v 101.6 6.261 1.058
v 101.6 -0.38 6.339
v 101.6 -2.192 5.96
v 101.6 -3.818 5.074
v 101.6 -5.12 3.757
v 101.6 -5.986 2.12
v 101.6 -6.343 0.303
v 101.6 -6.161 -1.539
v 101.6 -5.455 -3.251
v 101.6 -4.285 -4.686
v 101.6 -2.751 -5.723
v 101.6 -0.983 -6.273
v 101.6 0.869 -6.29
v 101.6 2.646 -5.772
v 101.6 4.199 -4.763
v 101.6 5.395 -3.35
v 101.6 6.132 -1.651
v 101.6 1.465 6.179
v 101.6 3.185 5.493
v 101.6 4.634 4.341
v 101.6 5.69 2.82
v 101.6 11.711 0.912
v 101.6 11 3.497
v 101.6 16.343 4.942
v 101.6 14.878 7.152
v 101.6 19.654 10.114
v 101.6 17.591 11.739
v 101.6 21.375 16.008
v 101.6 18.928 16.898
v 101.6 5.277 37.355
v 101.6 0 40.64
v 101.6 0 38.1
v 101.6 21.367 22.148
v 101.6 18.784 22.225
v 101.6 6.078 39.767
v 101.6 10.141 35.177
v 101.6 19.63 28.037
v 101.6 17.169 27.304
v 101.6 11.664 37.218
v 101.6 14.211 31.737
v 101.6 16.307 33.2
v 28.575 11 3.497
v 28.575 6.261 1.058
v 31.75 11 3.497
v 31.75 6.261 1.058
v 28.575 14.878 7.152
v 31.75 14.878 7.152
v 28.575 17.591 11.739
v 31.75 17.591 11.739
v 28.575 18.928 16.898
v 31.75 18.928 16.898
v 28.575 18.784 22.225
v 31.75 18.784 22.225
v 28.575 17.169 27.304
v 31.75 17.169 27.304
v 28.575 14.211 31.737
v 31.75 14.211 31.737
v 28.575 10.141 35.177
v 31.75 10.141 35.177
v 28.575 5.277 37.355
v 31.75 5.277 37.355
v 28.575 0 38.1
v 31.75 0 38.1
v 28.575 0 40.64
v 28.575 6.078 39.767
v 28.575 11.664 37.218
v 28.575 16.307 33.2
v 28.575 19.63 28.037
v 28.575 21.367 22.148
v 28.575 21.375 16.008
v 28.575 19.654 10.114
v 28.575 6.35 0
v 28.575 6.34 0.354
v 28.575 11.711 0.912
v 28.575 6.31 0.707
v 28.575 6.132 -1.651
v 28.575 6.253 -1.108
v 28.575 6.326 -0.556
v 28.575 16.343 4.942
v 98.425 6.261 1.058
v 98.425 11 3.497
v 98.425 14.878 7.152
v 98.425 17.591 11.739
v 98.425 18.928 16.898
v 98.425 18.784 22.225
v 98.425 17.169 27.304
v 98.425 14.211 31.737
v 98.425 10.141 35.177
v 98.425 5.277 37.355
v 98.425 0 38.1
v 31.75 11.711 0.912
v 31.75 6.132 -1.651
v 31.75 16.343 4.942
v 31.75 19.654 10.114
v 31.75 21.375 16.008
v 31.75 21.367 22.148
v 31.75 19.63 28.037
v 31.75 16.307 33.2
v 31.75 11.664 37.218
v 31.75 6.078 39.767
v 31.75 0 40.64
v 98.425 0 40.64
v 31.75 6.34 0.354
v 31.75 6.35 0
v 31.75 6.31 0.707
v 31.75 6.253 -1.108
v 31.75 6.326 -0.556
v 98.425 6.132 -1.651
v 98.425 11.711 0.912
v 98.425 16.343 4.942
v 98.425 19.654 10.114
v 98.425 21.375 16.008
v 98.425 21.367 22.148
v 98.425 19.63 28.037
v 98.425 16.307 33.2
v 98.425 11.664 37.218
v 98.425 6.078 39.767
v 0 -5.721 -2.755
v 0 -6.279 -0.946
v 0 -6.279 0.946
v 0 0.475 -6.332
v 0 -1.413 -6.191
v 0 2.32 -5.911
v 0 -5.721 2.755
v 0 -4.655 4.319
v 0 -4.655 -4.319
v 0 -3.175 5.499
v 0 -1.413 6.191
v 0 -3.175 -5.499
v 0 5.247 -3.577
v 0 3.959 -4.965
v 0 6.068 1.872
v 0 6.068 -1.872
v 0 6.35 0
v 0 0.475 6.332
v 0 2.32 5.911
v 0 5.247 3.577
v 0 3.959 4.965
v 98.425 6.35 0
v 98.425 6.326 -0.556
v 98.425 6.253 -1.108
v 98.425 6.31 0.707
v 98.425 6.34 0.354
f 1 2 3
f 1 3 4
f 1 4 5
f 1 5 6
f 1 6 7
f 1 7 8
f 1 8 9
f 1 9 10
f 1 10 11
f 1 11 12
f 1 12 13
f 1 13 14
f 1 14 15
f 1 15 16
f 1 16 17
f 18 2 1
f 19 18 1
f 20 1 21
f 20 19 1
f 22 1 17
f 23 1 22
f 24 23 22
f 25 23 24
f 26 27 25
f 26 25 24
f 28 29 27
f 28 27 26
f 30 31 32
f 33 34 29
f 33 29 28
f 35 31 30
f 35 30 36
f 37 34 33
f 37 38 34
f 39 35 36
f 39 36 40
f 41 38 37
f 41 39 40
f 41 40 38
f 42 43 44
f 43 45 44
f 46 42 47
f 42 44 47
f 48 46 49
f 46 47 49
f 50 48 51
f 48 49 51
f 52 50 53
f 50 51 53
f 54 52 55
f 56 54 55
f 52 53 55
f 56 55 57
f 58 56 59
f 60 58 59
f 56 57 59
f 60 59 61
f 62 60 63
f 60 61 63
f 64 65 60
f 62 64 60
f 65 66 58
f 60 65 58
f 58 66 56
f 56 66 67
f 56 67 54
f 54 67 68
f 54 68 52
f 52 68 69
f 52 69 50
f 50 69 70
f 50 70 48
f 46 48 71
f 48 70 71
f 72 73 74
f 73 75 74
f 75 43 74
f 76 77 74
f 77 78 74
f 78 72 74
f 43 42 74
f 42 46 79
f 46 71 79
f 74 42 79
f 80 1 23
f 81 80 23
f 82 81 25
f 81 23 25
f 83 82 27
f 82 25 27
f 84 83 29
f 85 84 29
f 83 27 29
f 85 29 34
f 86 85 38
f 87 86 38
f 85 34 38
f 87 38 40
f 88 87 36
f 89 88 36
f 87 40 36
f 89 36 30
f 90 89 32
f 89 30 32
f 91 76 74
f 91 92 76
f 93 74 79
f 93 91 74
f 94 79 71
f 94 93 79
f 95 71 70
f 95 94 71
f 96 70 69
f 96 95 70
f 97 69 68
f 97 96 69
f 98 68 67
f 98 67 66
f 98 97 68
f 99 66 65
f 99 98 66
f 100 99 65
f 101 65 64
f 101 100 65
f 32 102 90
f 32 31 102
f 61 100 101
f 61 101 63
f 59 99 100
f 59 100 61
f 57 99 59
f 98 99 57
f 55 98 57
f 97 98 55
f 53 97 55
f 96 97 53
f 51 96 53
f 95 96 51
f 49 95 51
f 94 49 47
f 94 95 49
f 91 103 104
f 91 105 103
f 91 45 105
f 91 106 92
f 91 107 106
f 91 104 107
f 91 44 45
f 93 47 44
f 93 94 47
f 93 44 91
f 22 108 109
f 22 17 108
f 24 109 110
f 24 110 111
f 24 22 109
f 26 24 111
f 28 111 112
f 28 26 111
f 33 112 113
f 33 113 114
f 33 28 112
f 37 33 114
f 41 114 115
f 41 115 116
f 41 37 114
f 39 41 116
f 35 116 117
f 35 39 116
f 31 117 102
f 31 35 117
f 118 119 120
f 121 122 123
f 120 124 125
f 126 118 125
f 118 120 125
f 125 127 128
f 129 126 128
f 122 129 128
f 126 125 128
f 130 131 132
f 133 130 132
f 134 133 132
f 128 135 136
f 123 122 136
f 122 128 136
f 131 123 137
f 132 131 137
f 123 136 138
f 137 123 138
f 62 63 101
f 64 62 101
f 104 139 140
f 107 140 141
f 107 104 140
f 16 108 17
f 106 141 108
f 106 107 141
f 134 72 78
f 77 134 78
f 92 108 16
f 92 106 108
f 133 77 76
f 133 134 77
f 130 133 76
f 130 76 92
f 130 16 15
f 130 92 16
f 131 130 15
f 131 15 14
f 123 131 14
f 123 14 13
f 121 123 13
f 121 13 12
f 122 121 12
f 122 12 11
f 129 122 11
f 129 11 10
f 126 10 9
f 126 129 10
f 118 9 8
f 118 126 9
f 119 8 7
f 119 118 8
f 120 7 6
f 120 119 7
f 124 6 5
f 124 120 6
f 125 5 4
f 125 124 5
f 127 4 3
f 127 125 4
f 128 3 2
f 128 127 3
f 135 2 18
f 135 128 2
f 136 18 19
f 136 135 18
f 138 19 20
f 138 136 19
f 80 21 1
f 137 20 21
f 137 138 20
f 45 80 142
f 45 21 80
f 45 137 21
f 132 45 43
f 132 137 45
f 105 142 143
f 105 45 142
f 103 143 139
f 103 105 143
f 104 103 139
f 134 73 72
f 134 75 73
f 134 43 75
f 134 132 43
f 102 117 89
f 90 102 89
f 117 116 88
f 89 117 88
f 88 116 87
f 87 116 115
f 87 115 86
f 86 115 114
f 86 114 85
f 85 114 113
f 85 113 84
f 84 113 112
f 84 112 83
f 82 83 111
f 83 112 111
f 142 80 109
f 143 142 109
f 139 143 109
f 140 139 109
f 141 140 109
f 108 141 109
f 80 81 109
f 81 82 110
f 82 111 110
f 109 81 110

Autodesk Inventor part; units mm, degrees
ref_plane "YZ Plane" through (0, 0, 0) normal (1, 0, 0) x (0, 1, 0)
ref_plane "XZ Plane" through (0, 0, 0) normal (0, 1, 0) x (-1, 0, 0)
sketch "Sketch1" plane through (0, 0, 0) normal (1, 0, 0) x (0, 1, 0)
  circle A0 centre (0, 0) radius 6.35
  dimension "d0" = 12.7
extrude "Extrusion1" add sketch "Sketch1" along normal blind 101.6
sketch "Sketch2" plane through (101.6, 0, 0) normal (1, 0, 0) x (0, 0, -1)
  line L0 (0, 0) -> (2.54, 0)
  line L1 (-40.64, 0) -> (-38.1, 0)
  arc A0 (0, 0) -> (-38.1, 0) centre (-19.05, 0) ccw
  arc A1 (2.54, 0) -> (-40.64, 0) centre (-19.05, 0) ccw
  dimension "d3" = 2.54
  dimension "d4" = 2.54
  dimension "d5" = 38.1
  dimension "d6" = 19.05
extrude "Extrusion2" add sketch "Sketch2" against normal blind 3.175
ref_plane "Work Plane1" through (31.75, 0, 0) normal (1, 0, 0) x (0, 0, -1)
sketch "Sketch3" plane through (31.75, 0, 0) normal (1, 0, 0) x (0, 0, -1)
  line L0 (0, 0) -> (2.54, 0)
  line L1 (-38.1, 0) -> (-40.64, 0)
  arc A0 (0, 0) -> (-38.1, 0) centre (-19.05, 0) ccw
  arc A1 (-1.0583, 6.2612) -> (-38.1, 0) centre (-19.05, 0) ccw
  line L2 (-1.0583, 6.2612) -> (0, 0)
  arc A2 (2.54, 0) -> (-40.64, 0) centre (-19.05, 0) ccw
  line L3 (-38.1, 0) -> (-40.64, 0) construction
  line L4 (0, 0) -> (2.54, 0) construction
  arc A3 (1.651, 6.1316) -> (-40.64, 0) centre (-19.05, 0) ccw
  arc A4 (1.651, 6.1316) -> (-1.0583, 6.2612) centre (0, 0) ccw
  point P0 (0, 0)
  dimension "d10" = 2.54
  dimension "d11" = 2.54
  dimension "d12" = 38.1
  dimension "d13" = 19.05
  dimension "d14" = 180
  dimension "d15" = 6.35
extrude "Extrusion3" add sketch "Sketch3" against normal blind 3.175 contours A0 L1 A2 A4
equation "\"d6\" = 0.5 * d5"
equation "\"d13\" = 0.5 * d12"
properties part number "pincherRight"
